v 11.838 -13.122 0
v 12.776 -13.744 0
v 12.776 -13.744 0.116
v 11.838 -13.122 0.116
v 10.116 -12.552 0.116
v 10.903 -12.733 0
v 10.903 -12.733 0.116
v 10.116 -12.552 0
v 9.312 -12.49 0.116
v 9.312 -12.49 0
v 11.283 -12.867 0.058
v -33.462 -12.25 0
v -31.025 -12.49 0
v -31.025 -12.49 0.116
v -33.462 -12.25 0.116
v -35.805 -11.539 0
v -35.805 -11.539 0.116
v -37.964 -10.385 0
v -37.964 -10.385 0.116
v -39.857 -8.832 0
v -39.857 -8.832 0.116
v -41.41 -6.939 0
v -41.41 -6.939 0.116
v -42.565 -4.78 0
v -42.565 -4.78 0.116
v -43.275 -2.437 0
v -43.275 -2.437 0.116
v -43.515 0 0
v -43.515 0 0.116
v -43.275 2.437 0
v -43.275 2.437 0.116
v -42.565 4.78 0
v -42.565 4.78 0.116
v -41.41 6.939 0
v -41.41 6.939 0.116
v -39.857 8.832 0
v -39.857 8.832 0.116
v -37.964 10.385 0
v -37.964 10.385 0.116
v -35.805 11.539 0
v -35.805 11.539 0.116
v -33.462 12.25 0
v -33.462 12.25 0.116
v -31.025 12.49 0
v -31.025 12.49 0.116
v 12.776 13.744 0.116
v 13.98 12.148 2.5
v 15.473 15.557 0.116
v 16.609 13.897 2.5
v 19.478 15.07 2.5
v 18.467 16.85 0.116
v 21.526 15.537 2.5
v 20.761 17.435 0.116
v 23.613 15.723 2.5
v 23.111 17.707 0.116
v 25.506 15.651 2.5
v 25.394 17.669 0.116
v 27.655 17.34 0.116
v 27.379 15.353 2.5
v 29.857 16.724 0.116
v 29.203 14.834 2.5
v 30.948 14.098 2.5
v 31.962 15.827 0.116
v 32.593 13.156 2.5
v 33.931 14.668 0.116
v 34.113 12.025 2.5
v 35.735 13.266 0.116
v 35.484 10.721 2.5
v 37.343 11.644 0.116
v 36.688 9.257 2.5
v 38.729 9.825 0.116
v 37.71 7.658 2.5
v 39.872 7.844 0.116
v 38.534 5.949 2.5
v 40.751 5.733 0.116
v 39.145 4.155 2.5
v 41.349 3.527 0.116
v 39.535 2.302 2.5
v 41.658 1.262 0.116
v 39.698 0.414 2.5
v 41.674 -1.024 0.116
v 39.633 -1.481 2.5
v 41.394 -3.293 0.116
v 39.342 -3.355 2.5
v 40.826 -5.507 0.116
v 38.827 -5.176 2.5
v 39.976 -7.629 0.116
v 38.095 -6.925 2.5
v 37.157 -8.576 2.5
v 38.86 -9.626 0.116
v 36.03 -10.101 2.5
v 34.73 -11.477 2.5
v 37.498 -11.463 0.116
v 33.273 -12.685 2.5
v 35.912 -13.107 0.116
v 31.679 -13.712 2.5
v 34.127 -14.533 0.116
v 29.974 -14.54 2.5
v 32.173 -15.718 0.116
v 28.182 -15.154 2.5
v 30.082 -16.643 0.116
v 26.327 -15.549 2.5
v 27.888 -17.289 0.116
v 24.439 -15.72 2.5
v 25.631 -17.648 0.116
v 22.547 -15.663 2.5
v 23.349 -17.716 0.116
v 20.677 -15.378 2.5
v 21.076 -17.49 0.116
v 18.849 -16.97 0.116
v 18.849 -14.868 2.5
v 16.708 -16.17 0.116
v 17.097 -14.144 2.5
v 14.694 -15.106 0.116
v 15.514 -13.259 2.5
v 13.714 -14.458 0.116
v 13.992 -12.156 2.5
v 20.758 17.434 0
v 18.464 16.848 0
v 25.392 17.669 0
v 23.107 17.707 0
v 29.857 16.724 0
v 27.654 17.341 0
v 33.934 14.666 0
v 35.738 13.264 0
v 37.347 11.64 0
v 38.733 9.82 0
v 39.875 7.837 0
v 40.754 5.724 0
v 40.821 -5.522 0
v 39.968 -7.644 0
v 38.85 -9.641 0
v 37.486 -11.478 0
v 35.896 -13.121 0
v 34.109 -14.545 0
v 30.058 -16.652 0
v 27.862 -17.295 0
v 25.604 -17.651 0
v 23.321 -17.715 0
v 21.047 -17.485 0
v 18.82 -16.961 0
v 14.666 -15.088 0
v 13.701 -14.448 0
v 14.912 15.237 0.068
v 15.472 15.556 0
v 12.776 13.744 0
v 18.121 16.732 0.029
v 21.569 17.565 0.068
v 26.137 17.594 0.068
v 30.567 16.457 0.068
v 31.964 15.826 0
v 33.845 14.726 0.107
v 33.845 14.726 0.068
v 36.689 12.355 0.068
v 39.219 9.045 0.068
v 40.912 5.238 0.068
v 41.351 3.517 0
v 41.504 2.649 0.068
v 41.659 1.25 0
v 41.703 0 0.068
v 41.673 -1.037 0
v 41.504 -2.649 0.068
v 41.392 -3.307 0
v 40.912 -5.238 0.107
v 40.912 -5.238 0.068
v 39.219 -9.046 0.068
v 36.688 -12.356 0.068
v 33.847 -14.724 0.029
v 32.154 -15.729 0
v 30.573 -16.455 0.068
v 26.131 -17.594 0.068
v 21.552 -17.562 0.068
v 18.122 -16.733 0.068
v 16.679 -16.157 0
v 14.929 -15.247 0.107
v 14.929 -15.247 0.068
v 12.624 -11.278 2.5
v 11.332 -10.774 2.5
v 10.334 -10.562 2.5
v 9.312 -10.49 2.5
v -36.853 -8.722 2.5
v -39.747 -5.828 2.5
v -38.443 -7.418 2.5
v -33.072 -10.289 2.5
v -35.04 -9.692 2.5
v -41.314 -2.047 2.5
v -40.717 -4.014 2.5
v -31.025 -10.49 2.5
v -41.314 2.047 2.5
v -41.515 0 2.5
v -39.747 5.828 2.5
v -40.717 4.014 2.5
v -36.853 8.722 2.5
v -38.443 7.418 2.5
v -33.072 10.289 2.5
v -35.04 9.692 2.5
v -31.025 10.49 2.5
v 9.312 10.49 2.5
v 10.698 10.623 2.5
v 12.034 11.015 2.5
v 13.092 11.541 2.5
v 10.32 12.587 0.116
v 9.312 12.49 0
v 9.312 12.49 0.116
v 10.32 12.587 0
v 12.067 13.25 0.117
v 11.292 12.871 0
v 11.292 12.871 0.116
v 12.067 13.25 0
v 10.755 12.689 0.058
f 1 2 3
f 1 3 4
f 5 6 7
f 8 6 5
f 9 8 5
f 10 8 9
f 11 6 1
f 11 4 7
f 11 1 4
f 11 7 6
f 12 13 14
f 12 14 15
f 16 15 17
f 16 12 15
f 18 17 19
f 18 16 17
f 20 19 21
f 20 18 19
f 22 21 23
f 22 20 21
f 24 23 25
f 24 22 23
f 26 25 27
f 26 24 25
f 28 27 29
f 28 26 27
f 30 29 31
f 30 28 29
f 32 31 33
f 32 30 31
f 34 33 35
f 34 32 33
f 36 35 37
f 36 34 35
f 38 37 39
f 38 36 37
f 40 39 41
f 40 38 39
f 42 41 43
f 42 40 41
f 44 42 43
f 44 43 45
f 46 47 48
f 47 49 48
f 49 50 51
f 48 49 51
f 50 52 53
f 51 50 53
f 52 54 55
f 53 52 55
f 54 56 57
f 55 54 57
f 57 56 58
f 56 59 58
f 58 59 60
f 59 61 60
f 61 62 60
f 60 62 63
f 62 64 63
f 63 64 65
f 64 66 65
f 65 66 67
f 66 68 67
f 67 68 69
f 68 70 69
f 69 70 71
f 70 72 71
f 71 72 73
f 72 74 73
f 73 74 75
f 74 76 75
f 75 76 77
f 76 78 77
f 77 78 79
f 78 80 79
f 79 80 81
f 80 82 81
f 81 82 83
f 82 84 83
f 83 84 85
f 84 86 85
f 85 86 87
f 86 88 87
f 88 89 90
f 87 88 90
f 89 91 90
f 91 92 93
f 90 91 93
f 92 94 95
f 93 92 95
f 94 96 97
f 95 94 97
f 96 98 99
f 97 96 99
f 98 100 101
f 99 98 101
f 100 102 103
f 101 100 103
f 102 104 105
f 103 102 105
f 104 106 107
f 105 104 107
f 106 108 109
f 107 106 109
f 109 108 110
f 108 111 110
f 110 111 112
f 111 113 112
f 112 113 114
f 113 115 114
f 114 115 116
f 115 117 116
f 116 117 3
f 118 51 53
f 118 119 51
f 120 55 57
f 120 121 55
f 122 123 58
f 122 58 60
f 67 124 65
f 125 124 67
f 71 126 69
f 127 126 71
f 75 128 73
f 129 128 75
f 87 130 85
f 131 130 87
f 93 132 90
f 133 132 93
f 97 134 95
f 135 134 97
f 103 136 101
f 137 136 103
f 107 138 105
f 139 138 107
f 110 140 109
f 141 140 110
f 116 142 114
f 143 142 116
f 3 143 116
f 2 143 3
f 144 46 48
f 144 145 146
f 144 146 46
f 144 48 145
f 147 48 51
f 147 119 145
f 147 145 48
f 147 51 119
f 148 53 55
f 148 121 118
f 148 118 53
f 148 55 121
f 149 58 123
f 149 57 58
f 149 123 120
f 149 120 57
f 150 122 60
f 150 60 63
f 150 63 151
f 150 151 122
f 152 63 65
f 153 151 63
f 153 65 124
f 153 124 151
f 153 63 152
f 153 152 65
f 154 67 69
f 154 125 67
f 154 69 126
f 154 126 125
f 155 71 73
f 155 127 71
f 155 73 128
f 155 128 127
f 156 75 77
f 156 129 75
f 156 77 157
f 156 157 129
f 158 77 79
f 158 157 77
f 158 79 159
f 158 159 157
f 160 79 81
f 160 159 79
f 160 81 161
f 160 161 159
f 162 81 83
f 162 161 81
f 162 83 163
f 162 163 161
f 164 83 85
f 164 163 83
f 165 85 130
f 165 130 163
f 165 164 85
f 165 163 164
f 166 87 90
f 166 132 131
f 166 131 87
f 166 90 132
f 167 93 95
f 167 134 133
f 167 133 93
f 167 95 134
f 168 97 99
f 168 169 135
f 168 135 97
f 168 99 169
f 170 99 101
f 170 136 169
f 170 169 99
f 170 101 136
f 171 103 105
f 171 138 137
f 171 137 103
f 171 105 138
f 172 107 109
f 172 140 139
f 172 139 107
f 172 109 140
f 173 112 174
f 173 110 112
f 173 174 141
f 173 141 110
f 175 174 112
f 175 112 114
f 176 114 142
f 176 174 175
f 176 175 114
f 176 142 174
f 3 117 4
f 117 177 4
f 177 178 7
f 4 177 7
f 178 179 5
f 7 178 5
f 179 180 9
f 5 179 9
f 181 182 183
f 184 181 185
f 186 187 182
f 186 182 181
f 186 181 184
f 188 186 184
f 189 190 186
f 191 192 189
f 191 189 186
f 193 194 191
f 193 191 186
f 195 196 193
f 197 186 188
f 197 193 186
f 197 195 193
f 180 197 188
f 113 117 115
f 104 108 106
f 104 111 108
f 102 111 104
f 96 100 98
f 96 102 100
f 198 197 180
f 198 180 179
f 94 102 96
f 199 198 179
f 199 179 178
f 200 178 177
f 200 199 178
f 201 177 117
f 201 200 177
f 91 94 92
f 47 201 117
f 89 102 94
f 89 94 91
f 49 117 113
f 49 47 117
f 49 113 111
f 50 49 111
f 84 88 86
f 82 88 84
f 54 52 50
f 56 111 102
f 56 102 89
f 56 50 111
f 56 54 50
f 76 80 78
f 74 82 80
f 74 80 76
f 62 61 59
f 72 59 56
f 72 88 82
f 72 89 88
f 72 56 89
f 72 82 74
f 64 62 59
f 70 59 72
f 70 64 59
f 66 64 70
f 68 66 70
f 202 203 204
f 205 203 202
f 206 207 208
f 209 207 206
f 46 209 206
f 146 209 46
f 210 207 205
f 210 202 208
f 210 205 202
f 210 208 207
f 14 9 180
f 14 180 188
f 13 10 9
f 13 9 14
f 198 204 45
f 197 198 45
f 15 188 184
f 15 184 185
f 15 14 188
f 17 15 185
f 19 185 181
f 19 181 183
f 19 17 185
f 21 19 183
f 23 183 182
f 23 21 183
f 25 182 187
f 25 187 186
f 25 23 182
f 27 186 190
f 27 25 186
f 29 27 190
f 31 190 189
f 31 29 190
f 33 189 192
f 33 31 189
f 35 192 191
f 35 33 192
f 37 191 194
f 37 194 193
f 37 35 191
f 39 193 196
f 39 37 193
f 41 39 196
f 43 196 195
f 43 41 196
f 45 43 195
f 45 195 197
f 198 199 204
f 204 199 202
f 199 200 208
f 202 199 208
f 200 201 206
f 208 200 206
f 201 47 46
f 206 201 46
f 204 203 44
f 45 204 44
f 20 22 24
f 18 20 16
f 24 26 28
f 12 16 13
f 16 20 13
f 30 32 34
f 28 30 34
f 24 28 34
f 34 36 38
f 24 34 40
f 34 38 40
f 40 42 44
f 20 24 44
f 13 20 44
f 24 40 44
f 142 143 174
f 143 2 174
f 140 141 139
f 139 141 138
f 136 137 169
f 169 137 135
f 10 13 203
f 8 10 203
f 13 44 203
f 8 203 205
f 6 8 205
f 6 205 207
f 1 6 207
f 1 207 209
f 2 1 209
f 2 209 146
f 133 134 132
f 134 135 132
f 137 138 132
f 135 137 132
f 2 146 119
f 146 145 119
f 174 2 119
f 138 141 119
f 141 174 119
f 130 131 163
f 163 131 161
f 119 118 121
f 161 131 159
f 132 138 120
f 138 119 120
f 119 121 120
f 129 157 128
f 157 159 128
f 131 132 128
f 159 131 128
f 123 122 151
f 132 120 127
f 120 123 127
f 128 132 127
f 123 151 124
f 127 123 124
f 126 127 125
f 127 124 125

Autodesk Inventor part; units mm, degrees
ref_plane "YZ Plane" through (0, 0, 0) normal (1, 0, 0) x (0, 1, 0)
ref_plane "XZ Plane" through (0, 0, 0) normal (0, 1, 0) x (-1, 0, 0)
ref_plane "XY Plane" through (0, 0, 0) normal (0, 0, 1) x (1, 0, 0)
sketch "Sketch1" plane through (0, 0, 0) normal (0, 0, 1) x (1, 0, 0)
  spline S0 degree 3 poles (12.7758, 13.7437) (13.4536, 14.296) (14.1651, 14.793) (16.9373, 16.4418) (19.2243, 17.2436) (24.5957, 17.9791) (27.7237, 17.5963) (32.8694, 15.5351) (34.9647, 14.1297) (38.6283, 10.3594) (40.0896, 7.8966) (41.4354, 3.545) (41.7033, 1.7728) (41.7033, 0) (41.7033, -1.7729) (41.4354, -3.5451) (40.0895, -7.897) (38.6278, -10.3602) (34.9655, -14.1286) (32.8727, -15.5328) (27.7225, -17.598) (24.5861, -17.9808) (19.2198, -17.2406) (16.945, -16.4433) (14.1759, -14.8006) (13.4587, -14.3002) (12.7758, -13.7437) knots 0.047577 0.047577 0.047577 0.047577 0.308418 0.308418 1.015437 1.015437 1.927825 1.927825 2.666741 2.666741 3.497446 3.497446 4.02653 4.02653 4.02653 4.555615 4.555615 5.386442 5.386442 6.124601 6.124601 7.039356 7.039356 7.74266 7.74266 8.00548 8.00548 8.00548 8.00548 weights 1 1 1 1 1 1 1 1 1 1 1 1 1 1 1 1 1 1 1 1 1 1 1 1 1 1 1
  spline S1 degree 3 poles (12.7758, -13.7437) (12.3265, -13.3776) (11.8219, -13.0794) (10.6568, -12.62) (9.9847, -12.4901) (9.3118, -12.4901) knots 0 0 0 0 0.462707 0.462707 1 1 1 1 weights 1 1 1 1 1 1
  line L0 (9.3118, -12.4901) -> (-31.0253, -12.4901)
  spline S2 degree 3 poles (9.3118, 12.4901) (9.7991, 12.4901) (10.2862, 12.5578) (11.492, 12.896) (12.1826, 13.2604) (12.7758, 13.7437) knots 0 0 0 0 0.389114 0.389114 1 1 1 1 weights 1 1 1 1 1 1
  line L1 (0, 0) -> (-42.2873, 0) construction
  line L2 (9.3118, 12.4901) -> (-31.0253, 12.4901)
  arc A0 (-31.0253, 12.4901) -> (-31.0253, -12.4901) centre (-31.0253, 0) ccw
extrude "Extrusion1" add sketch "Sketch1" along normal blind 2.5
chamfer "Chamfer1" distance 2 angle 50 6 edges at (41.7033, 0, 2.5) (11.1518, -12.8172, 2.5) (-10.8568, -12.4901, 2.5) (-43.5155, 0, 2.5) (-10.8568, 12.4901, 2.5) (11.1517, 12.8172, 2.5) measured on face at (-4.1339, -4.1634, 2.5)
sketch "Sketch6" plane through (0, 0, 2.5) normal (0, 0, 1) x (1, 0, 0)
  line L0 (-9.5253, -2.5425) -> (-15.3564, -2.5425) construction
  line L1 (-15.3564, -2.5425) -> (-15.3564, 2.5425) construction
  line L2 (-15.3564, 2.5425) -> (-9.5253, 2.5425) construction
  line L3 (-9.5253, 2.5425) -> (-9.5253, -2.5425) construction
  point P0 (0, 0)
  point P1 (-6.2263, 0)
decal "Decal1"
ref_plane "Work Plane1" through (0, 0, 0) normal (0.2164396, 0, 0.976296) x (0, 1, 0)
sketch "Sketch7" plane through (0, 0, 0) normal (0.2164396, 0, 0.976296) x (0, 1, 0)
  point P0 (0, 0)
ref_plane "Work Plane2" through (0, 0, 0) normal (0.2164396, 0, 0.976296) x (0, 1, 0)
properties part number "gornji shiny dio"
